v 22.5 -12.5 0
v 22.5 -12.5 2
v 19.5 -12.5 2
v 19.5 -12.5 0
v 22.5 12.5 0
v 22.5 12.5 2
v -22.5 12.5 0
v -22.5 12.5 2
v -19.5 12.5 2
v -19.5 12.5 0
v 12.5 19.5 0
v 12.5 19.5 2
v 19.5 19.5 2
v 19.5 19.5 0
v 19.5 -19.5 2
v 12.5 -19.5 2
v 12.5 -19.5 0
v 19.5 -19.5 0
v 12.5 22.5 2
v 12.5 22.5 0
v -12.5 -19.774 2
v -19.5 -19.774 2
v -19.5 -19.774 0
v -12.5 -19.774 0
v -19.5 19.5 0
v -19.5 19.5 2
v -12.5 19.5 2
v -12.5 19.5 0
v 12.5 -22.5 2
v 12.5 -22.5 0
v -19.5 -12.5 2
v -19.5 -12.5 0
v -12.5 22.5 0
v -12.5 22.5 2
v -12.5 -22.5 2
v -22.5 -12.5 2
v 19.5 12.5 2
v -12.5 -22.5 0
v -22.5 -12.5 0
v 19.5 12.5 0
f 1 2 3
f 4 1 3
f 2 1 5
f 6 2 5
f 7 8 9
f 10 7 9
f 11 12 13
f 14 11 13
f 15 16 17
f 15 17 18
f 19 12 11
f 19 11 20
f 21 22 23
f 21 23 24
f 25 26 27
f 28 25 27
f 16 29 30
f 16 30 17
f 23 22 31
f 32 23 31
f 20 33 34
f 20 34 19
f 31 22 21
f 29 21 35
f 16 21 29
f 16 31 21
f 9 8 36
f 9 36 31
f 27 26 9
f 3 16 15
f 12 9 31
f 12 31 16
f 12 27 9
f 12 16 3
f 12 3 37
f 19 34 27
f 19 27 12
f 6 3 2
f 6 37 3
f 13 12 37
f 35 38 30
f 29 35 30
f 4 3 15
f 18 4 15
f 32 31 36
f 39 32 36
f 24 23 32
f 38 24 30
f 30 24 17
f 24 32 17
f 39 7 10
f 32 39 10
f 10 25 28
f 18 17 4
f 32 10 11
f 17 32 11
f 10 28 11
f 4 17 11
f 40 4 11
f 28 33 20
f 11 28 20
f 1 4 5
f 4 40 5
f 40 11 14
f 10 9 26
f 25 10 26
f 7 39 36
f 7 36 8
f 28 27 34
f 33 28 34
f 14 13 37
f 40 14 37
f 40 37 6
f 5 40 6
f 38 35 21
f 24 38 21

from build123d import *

# Parameters (mm, degrees)
SKETCH1_W           = 45
SKETCH1_H           = 45
BOSS_EXTRUDE1_DEPTH = 2
SKETCH2_W           = 7
SKETCH2_H           = 2.72647494
SKETCH2_H_2         = 3
SKETCH2_W_2         = 3
SKETCH2_H_3         = 7
CUT_EXTRUDE1_DEPTH  = 10


with BuildPart() as part:
    # Sketch1 → Boss-Extrude1 (new body)
    with BuildSketch(Plane.XY):
        Rectangle(SKETCH1_W, SKETCH1_H)
    extrude(amount=BOSS_EXTRUDE1_DEPTH)

    # Sketch2 → Cut-Extrude1 (cut)
    with BuildSketch(Plane.XY.offset(2)):
        Polygon((-22.5, -12.5), (-22.5, -22.5), (-19.5, -22.5), (-19.5, -19.77352506), (-19.5, -12.5), align=None)
        with Locations((-16, -21.13676253)):
            Rectangle(SKETCH2_W, SKETCH2_H)
        Polygon((19.5, -22.5), (22.5, -22.5), (22.5, -12.5), (19.5, -12.5), (19.5, -19.5), align=None)
        with Locations((16, -21)):
            Rectangle(SKETCH2_W, SKETCH2_H_2)
        Polygon((-12.5, 22.5), (-22.5, 22.5), (-22.5, 19.5), (-19.5, 19.5), (-12.5, 19.5), align=None)
        with Locations((-21, 16)):
            Rectangle(SKETCH2_W_2, SKETCH2_H_3)
        Polygon((22.5, 12.5), (22.5, 22.5), (19.5, 22.5), (19.5, 19.5), (19.5, 12.5), align=None)
        with Locations((16, 21)):
            Rectangle(SKETCH2_W, SKETCH2_H_2)
    extrude(amount=-CUT_EXTRUDE1_DEPTH, mode=Mode.SUBTRACT)


solid = part.part
